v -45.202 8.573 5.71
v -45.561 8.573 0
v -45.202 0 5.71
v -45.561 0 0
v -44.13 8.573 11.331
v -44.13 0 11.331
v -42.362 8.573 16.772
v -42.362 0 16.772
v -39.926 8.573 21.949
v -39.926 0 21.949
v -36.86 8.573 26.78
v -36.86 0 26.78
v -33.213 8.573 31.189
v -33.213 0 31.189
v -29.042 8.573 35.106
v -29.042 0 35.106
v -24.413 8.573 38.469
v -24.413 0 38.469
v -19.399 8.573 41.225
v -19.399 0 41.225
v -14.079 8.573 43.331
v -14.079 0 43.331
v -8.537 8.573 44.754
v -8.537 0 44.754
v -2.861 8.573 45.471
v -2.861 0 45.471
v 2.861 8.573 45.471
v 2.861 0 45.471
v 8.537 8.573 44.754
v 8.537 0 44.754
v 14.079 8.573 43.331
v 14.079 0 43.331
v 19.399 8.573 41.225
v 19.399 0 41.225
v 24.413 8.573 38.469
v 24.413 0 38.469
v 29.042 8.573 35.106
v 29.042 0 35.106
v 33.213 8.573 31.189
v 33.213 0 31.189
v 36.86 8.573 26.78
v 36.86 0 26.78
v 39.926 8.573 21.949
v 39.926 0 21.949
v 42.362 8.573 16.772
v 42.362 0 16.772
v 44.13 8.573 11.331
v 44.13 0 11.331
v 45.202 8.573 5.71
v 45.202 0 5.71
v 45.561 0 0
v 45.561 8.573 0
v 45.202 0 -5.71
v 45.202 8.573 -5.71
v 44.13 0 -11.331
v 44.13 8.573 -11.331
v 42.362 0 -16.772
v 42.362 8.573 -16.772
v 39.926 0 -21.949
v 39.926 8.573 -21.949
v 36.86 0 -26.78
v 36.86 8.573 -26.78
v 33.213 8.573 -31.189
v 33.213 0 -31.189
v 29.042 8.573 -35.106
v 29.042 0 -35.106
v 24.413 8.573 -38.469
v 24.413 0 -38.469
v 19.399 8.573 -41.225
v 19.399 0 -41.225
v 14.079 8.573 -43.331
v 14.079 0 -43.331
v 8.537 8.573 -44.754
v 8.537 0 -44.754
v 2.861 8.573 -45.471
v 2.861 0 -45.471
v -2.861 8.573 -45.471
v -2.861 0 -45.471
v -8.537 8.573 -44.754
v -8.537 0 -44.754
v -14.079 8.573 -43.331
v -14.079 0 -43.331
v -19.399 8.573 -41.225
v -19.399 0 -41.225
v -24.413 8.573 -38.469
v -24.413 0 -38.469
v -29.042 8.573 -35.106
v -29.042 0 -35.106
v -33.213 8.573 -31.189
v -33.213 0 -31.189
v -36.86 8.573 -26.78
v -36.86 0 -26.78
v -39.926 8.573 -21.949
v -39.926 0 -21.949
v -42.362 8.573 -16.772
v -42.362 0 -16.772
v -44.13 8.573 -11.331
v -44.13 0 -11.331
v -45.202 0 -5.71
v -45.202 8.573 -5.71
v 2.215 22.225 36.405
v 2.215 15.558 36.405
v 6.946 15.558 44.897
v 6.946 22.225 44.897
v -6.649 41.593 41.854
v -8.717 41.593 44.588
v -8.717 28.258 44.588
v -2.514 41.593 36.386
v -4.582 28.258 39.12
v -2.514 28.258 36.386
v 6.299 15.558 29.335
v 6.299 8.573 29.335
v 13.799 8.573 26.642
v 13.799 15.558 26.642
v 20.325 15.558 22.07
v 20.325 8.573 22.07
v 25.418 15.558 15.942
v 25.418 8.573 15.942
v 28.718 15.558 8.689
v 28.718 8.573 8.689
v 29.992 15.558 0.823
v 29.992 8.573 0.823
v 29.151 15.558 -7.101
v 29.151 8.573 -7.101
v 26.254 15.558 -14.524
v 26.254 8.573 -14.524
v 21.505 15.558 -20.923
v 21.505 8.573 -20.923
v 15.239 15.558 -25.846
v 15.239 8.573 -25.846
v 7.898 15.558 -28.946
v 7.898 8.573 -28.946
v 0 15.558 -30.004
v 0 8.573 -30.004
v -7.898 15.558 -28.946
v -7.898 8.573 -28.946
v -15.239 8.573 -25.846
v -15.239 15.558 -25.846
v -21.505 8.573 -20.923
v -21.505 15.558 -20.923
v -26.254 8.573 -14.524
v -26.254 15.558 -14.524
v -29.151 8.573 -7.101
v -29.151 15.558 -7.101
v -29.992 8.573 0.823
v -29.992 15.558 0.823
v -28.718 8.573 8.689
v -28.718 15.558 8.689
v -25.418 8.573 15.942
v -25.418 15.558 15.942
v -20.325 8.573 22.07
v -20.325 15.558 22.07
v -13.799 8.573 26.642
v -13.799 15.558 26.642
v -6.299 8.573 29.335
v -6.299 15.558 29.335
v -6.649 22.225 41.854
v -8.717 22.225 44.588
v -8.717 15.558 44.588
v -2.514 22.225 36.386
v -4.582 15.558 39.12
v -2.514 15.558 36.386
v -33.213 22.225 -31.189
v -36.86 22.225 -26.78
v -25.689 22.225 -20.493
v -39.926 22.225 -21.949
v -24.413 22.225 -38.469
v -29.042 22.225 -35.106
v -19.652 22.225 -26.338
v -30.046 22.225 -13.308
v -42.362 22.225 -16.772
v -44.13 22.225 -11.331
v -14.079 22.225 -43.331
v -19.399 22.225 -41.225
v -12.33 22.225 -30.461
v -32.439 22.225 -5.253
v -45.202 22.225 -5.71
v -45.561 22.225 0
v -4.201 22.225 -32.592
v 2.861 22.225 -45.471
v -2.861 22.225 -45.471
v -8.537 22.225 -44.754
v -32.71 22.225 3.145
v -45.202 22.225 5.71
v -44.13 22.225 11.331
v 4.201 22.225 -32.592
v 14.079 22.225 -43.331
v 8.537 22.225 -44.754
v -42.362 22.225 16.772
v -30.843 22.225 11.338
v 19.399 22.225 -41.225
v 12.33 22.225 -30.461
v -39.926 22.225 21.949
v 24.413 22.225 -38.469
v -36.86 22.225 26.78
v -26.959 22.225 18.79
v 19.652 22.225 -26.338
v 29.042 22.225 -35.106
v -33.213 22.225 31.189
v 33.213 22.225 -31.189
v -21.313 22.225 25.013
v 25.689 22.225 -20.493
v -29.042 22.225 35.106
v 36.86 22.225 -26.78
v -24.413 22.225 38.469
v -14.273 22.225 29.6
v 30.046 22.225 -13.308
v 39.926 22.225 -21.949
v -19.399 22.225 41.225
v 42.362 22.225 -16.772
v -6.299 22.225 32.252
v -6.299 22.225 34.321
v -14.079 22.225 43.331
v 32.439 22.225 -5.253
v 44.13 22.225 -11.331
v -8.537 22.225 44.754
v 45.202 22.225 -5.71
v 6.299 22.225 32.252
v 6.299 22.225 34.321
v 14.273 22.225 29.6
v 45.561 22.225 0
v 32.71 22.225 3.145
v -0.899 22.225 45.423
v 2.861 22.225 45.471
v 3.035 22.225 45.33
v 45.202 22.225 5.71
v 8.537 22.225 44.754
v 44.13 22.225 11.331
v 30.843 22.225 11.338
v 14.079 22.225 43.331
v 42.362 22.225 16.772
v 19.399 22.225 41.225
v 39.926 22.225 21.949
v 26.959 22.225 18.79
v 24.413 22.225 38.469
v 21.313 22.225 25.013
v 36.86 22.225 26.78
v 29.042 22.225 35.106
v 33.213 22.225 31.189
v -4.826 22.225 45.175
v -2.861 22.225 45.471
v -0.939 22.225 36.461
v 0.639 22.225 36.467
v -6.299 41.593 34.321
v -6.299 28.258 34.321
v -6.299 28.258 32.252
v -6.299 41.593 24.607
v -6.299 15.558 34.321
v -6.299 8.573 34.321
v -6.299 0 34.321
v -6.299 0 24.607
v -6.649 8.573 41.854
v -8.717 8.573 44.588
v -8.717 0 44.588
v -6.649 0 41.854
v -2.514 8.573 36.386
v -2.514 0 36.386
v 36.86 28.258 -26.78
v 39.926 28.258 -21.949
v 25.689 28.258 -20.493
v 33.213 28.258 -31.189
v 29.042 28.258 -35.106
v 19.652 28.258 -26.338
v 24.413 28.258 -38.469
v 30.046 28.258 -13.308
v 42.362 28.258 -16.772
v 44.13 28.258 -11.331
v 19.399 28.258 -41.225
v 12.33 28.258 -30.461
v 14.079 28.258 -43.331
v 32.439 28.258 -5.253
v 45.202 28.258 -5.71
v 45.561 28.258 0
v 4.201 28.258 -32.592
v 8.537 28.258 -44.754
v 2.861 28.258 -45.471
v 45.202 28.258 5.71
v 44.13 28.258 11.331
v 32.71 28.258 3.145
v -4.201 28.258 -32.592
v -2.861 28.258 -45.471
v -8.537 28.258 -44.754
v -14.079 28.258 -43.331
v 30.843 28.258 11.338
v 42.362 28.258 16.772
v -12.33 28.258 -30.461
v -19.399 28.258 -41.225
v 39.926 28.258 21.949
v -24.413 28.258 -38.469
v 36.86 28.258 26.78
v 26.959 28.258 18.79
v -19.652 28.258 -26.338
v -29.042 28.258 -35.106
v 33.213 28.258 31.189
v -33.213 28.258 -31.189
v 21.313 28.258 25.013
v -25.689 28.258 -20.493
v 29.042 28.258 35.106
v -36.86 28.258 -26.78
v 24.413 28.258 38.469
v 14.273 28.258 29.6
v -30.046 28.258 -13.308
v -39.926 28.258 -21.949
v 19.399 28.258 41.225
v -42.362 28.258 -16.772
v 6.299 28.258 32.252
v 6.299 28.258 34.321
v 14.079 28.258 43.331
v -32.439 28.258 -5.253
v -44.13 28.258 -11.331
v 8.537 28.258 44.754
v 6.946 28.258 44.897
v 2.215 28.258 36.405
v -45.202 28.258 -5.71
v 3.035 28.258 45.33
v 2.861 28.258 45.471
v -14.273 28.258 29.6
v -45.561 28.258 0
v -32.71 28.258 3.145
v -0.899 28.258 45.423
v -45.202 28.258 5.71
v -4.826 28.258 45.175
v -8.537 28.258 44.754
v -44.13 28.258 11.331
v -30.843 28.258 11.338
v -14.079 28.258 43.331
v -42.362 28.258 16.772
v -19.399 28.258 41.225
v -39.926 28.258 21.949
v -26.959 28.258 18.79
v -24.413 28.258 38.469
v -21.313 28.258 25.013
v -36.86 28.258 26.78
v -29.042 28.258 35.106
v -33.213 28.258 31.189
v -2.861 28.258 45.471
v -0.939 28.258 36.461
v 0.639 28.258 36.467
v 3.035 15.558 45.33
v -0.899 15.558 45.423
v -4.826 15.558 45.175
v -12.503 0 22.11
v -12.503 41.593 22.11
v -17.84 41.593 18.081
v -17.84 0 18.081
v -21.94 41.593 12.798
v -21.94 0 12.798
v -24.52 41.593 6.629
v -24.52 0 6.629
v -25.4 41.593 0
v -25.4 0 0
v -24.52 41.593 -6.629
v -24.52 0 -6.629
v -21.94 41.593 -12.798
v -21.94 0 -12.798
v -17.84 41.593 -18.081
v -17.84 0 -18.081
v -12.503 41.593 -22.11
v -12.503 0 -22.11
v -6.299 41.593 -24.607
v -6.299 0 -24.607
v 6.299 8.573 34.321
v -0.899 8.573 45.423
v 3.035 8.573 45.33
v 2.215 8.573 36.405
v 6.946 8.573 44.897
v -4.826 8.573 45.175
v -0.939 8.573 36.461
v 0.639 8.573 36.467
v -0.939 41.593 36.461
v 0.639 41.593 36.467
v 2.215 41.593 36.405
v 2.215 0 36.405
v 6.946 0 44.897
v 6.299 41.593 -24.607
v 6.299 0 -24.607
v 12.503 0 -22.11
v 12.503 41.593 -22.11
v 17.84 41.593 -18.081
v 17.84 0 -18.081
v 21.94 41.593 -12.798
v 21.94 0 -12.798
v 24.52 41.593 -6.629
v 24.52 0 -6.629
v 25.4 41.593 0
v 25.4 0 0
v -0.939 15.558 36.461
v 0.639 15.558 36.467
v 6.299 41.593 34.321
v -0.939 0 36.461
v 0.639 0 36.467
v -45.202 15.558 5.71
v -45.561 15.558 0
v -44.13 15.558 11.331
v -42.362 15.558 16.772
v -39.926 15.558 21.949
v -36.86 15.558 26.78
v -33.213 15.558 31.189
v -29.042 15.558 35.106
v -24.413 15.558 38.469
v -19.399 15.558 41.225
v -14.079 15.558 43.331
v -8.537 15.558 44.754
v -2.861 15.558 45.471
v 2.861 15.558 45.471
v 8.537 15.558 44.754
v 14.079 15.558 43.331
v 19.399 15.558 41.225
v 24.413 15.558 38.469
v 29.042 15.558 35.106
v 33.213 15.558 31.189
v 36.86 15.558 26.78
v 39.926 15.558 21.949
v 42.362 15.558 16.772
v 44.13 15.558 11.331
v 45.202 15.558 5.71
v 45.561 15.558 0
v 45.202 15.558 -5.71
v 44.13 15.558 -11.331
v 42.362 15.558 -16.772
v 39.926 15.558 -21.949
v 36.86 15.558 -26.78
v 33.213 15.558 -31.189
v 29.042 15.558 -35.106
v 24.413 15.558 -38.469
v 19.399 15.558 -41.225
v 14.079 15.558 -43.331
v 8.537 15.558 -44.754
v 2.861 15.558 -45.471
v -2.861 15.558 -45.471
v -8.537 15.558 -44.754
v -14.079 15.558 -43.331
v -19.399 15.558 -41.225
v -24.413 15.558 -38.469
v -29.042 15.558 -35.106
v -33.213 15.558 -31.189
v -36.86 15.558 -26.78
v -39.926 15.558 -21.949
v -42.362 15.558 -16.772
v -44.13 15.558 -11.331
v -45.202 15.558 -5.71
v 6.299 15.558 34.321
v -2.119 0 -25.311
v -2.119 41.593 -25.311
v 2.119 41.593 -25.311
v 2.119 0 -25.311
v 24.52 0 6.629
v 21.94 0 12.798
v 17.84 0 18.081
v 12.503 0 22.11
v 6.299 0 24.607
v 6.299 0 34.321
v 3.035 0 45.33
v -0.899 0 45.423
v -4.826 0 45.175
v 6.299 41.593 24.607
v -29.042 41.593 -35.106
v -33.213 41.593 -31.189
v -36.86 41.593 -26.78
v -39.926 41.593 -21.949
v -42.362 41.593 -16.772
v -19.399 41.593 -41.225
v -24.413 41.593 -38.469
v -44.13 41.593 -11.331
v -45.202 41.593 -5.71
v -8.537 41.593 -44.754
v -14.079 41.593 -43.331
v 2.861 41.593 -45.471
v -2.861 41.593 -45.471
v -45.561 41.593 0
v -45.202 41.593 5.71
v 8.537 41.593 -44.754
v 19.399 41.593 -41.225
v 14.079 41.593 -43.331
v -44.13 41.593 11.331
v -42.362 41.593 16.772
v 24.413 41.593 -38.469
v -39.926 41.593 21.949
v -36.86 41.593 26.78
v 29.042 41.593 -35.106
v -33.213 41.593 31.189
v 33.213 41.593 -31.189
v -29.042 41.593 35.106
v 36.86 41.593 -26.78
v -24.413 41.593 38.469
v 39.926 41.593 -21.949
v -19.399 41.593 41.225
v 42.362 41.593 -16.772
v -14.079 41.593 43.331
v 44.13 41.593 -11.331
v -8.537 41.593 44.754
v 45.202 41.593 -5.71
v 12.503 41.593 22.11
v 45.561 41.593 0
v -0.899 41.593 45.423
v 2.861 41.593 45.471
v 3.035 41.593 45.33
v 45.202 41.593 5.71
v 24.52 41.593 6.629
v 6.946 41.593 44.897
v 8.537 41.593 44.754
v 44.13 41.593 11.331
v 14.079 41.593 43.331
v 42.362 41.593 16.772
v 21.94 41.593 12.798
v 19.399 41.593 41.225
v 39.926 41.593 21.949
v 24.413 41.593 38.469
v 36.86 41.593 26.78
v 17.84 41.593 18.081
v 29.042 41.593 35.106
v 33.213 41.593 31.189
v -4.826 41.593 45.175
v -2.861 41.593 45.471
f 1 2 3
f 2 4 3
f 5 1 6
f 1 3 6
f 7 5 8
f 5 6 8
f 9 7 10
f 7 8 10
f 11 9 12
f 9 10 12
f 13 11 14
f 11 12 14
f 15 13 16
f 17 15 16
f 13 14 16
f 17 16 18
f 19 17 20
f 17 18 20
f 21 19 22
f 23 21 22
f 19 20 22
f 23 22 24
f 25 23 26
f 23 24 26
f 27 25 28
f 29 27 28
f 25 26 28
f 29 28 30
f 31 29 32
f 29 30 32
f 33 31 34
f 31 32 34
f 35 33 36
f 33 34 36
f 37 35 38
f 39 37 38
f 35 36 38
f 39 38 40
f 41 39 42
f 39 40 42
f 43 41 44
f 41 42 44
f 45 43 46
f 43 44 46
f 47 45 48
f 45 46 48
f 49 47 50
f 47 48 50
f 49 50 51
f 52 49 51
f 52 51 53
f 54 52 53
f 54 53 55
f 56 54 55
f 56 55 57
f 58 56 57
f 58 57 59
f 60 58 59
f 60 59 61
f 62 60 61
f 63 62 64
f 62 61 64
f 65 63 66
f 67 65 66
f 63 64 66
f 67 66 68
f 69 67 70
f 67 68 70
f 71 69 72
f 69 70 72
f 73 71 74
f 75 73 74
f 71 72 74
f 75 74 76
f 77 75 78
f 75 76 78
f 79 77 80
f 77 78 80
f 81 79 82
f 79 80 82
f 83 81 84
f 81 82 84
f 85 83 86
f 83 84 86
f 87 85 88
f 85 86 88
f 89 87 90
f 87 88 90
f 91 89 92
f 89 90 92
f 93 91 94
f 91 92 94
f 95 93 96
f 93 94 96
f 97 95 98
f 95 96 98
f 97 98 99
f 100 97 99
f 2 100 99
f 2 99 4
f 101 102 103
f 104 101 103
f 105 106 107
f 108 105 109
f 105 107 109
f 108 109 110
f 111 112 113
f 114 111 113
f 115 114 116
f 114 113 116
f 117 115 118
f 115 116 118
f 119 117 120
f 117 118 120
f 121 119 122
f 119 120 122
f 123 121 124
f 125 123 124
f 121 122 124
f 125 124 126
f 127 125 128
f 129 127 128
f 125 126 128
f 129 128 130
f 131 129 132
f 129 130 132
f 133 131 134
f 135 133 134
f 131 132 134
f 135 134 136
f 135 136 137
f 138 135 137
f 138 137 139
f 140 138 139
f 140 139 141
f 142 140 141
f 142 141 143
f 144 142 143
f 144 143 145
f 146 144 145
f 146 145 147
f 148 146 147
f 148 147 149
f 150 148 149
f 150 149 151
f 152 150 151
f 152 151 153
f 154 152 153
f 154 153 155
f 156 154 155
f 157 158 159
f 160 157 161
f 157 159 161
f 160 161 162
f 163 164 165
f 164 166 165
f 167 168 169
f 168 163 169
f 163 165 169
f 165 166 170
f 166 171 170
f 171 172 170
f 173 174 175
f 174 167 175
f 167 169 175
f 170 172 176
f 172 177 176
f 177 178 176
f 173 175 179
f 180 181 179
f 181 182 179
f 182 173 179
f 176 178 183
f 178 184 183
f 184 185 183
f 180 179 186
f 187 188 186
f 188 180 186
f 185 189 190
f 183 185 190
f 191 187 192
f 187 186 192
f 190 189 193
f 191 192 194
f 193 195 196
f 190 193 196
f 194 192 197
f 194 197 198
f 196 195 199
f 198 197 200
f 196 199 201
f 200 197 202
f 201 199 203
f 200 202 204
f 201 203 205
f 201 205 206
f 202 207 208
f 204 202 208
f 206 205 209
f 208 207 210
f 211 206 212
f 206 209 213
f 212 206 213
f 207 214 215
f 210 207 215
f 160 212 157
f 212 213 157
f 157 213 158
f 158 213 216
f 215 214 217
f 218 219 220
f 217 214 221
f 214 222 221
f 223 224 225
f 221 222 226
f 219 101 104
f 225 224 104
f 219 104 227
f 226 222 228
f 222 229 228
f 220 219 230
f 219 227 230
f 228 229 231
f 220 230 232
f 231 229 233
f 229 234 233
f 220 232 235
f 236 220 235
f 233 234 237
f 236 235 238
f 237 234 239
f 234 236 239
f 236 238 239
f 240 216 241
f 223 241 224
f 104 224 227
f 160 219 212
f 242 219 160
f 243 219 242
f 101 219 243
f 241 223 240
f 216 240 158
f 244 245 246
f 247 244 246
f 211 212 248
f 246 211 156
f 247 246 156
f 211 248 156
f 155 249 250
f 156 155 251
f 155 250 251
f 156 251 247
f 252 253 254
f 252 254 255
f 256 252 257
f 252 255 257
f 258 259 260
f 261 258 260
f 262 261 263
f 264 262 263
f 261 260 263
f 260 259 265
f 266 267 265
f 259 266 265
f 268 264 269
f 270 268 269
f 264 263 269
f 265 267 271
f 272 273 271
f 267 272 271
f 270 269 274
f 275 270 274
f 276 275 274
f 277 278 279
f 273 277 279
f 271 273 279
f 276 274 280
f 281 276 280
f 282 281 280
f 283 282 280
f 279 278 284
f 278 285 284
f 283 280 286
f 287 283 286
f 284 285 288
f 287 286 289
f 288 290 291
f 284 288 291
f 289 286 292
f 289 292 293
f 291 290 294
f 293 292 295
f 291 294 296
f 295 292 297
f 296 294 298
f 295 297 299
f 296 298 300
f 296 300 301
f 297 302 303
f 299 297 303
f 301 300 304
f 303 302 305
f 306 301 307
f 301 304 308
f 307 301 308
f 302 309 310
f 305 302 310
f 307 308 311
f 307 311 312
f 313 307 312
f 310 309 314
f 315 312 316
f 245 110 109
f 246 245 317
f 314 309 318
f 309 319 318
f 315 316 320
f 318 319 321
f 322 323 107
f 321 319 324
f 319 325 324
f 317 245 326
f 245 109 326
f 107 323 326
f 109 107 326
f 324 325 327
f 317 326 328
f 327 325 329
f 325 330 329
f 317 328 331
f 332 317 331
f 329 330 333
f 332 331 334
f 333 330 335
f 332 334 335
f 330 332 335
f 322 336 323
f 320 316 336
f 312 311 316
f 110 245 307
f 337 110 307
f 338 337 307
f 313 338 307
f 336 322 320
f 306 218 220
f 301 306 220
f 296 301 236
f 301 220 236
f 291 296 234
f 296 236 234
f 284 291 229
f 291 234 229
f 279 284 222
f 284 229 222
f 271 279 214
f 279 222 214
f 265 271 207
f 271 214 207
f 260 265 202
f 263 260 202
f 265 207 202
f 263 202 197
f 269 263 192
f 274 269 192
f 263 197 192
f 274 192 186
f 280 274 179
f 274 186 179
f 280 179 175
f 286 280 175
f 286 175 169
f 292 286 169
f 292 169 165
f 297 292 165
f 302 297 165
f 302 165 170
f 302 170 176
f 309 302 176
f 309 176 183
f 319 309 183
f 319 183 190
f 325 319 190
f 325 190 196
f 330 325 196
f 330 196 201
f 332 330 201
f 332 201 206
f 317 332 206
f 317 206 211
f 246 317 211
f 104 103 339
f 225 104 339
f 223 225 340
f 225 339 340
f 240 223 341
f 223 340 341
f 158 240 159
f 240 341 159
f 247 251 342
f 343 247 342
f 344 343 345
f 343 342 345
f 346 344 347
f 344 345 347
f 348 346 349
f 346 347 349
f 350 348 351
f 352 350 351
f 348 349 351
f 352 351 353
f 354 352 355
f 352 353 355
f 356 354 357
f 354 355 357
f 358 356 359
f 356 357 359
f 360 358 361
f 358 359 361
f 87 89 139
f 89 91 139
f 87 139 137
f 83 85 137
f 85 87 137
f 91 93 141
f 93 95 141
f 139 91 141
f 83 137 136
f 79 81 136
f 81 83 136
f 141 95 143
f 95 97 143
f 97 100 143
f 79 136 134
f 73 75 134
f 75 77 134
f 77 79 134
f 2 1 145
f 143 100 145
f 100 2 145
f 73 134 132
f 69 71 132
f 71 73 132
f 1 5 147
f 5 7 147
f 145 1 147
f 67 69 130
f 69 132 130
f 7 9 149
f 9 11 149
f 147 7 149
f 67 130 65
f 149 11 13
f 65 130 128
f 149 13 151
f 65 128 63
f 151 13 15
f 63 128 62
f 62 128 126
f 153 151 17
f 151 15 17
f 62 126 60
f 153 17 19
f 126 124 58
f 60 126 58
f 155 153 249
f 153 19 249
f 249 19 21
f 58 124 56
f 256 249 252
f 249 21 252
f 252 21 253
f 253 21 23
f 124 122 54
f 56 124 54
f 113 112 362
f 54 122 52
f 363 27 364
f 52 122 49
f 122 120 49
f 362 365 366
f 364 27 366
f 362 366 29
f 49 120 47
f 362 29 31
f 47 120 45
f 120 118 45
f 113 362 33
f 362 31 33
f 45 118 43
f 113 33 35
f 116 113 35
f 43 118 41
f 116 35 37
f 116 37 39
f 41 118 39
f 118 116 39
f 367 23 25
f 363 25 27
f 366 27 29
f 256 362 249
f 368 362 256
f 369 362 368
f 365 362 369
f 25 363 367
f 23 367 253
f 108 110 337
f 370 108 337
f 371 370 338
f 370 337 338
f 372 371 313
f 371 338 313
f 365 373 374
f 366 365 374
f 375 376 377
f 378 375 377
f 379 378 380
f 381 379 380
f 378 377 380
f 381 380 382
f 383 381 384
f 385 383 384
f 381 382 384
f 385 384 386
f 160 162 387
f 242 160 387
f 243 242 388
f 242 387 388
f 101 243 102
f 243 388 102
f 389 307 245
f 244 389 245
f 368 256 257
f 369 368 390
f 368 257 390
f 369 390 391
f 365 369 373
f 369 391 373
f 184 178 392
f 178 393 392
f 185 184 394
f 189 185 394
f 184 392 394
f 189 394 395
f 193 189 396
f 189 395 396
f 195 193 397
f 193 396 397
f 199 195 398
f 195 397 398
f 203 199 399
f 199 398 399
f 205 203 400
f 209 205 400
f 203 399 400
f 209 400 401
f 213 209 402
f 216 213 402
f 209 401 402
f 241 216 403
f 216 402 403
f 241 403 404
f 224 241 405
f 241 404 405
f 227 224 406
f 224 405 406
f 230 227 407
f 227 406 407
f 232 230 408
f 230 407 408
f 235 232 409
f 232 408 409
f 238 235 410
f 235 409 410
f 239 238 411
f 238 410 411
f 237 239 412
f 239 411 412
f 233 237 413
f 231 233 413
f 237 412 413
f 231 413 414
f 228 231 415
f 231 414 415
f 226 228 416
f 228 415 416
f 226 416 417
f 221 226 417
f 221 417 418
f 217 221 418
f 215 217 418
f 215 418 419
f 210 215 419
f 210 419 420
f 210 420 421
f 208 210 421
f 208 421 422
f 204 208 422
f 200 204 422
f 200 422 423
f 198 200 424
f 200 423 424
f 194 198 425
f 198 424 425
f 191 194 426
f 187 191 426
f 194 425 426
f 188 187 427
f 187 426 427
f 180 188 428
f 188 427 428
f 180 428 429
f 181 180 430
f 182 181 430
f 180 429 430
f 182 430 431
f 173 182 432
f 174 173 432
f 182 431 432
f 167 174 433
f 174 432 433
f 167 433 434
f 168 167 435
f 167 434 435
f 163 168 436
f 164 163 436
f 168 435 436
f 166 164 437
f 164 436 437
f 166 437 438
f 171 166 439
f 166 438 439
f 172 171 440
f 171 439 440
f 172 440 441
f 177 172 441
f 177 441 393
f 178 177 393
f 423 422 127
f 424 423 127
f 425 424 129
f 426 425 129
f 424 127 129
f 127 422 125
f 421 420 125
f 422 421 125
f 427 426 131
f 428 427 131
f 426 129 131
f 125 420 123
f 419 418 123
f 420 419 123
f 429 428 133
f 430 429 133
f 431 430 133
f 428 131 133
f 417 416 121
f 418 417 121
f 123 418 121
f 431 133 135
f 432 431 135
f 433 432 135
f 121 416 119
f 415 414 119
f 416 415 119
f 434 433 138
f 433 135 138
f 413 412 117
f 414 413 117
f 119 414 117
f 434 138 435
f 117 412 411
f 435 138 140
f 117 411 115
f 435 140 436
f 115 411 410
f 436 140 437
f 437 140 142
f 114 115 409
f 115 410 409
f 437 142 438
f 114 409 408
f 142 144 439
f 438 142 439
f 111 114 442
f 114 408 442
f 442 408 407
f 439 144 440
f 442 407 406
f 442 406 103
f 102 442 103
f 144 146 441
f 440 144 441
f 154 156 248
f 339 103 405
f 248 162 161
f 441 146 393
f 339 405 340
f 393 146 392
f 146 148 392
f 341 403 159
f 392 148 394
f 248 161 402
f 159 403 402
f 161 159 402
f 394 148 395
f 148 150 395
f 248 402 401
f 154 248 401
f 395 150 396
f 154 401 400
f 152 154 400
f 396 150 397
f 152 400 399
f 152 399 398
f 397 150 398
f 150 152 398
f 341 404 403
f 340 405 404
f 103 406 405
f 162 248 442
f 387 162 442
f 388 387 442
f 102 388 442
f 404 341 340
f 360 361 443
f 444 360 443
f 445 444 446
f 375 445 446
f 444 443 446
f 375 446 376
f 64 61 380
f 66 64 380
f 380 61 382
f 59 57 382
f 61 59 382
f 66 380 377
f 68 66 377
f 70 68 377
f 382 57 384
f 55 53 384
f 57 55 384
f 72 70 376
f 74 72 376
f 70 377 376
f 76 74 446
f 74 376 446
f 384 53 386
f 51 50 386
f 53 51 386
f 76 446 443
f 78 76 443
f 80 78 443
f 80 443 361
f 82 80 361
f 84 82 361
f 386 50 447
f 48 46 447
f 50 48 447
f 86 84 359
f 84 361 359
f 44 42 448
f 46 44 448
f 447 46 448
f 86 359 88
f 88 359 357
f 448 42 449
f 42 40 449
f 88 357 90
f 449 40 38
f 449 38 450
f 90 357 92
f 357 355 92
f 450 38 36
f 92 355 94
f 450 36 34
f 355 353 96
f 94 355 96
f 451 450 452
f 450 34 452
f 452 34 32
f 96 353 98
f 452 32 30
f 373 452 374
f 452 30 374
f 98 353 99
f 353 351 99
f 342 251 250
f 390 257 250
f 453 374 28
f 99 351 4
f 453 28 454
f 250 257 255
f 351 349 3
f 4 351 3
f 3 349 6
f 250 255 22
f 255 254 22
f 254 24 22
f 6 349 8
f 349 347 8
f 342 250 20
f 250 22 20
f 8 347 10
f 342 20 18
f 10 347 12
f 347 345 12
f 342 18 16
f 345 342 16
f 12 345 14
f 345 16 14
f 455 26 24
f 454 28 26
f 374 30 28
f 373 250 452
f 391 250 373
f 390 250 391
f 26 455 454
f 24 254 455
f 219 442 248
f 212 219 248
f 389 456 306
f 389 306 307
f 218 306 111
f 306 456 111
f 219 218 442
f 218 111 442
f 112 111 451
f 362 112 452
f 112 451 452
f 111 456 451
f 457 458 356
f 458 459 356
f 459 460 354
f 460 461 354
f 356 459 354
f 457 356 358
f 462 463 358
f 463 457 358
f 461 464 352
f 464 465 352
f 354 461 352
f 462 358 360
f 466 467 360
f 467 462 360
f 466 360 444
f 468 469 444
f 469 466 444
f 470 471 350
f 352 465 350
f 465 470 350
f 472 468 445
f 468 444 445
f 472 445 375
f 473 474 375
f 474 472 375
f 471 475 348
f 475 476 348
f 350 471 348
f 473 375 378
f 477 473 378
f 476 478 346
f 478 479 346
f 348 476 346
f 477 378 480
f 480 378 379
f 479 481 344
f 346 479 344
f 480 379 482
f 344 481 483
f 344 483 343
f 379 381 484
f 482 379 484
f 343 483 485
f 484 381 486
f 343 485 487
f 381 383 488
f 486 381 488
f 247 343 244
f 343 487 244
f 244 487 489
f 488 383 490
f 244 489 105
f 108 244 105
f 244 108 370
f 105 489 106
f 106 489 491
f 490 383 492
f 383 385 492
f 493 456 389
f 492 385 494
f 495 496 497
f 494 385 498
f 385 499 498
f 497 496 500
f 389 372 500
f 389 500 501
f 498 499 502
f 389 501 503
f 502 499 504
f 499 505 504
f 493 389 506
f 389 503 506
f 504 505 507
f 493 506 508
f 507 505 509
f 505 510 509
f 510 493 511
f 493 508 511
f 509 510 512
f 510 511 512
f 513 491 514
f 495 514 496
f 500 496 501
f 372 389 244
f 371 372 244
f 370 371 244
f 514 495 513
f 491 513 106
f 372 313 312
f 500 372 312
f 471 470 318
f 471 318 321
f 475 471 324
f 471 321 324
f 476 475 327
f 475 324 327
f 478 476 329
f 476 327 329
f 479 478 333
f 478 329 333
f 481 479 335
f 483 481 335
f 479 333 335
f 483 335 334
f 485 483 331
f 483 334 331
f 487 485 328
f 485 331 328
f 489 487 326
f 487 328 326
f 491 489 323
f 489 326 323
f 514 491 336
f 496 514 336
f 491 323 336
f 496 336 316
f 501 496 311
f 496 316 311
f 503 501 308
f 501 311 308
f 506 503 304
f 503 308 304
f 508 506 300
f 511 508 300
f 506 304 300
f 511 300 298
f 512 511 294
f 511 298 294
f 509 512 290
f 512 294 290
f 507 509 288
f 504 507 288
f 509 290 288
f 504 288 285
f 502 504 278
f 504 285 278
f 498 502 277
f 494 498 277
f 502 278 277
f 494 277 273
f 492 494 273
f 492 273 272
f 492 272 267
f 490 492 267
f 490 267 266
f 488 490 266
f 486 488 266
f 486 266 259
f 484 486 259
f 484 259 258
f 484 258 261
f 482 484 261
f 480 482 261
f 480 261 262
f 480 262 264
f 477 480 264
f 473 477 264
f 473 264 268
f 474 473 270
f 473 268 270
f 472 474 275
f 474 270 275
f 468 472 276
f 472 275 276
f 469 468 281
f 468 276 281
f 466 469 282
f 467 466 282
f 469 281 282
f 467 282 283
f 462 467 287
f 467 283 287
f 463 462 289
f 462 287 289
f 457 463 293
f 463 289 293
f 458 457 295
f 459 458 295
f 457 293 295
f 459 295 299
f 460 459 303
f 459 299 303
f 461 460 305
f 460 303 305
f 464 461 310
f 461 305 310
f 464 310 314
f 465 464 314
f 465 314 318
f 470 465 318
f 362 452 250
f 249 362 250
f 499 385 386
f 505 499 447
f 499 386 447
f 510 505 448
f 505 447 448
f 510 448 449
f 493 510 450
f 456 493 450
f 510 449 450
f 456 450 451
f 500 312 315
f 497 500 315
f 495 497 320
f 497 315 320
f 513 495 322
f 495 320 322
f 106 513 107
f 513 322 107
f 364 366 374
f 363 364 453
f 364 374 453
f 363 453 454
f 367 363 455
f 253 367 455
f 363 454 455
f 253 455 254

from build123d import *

# Parameters (mm, degrees)
F3_D     = 13.1064
F2_W     = 6.2990644947
F2_H     = 14.0903731808
F2_W_2   = 3.3267904073
F4_DEPTH = 121.412
F6_DEPTH = 62.23


with BuildPart() as f1:
    # F0 (on Top) → F1 (revolve)
    with BuildSketch(Plane.XY):
        Polygon((-45.5612460607, 0), (0, 0), (0, 41.5925026262), (-45.5612460607, 41.5925026262), (-45.5612460607, 28.2575048772), (-32.8612460607, 28.2575048772), (-32.8612460607, 22.2250052524), (-45.5612460607, 22.2250052524), (-45.5612460607, 15.5575048772), (-30.0037471862, 15.5575048772), (-30.0037471862, 8.5725056276), (-45.5612460607, 8.5725056276), align=None)
    revolve(axis=Axis((0, 20.7962513131, 0), (0, 1, 0)))

    # F3 (through all)
    with Locations(Plane.XZ):
        with Locations((0, 0)):
            Hole(F3_D / 2)

    # F2 (on face) → F4 (cut)
    with BuildSketch(Plane.XZ):
        with BuildLine():
            ThreePointArc((-6.2990644947, 24.6065395066), (0, 25.4), (6.2990644947, 24.6065395066))
            Line((6.2990644947, 24.6065395066), (6.2990644947, 34.3211814761))
            Line((6.2990644947, 34.3211814761), (-6.2990644947, 34.3211814761))
            Line((-6.2990644947, 34.3211814761), (-6.2990644947, 24.6065395066))
        make_face()
        with BuildLine():
            Line((-6.2990644947, -24.6065395066), (-6.2990644947, 24.6065395066))
            ThreePointArc((-6.2990644947, 24.6065395066), (-25.4, 0), (-6.2990644947, -24.6065395066))
        make_face()
        with BuildLine():
            ThreePointArc((6.2990644947, -24.6065395066), (20.0643494557, -15.5750403183), (25.4, 0))
            ThreePointArc((25.4, 0), (20.0643494557, 15.5750403183), (6.2990644947, 24.6065395066))
            Line((6.2990644947, 24.6065395066), (6.2990644947, 14.0903731808))
            Line((6.2990644947, 14.0903731808), (9.625854902, 14.0903731808))
            Line((9.625854902, 14.0903731808), (9.625854902, 0))
            Line((9.625854902, 0), (6.2990644947, 0))
            Line((6.2990644947, 0), (6.2990644947, -24.6065395066))
        make_face()
        with BuildLine():
            Line((6.2990644947, 14.0903731808), (6.2990644947, 24.6065395066))
            ThreePointArc((6.2990644947, 24.6065395066), (0, 25.4), (-6.2990644947, 24.6065395066))
            Line((-6.2990644947, 24.6065395066), (-6.2990644947, -24.6065395066))
            ThreePointArc((-6.2990644947, -24.6065395066), (0, -25.4), (6.2990644947, -24.6065395066))
            Line((6.2990644947, -24.6065395066), (6.2990644947, 0))
            Line((6.2990644947, 0), (0, 0))
            Line((0, 0), (0, 14.0903731808))
            Line((0, 14.0903731808), (6.2990644947, 14.0903731808))
        make_face()
        with Locations((3.1495322473, 7.0451865904)):
            Rectangle(F2_W, F2_H)
        with Locations((7.9624596983, 7.0451865904)):
            Rectangle(F2_W_2, F2_H)
    extrude(amount=-F4_DEPTH, mode=Mode.SUBTRACT)

    # F5 (on face) → F6 (cut)
    with BuildSketch(Plane.XZ):
        with BuildLine():
            ThreePointArc((-2.5140134585, 36.3859235352), (-0.149933756, 36.4723623453), (2.2147767132, 36.4053630567))
            Line((2.2147767132, 36.4053630567), (6.9459112404, 44.897428845))
            ThreePointArc((6.9459112404, 44.897428845), (-0.8987586114, 45.4226488969), (-8.7165118801, 44.5875231483))
            Line((-8.7165118801, 44.5875231483), (-2.5140134585, 36.3859235352))
        make_face()
    extrude(amount=-F6_DEPTH, mode=Mode.SUBTRACT)


solid = f1.part
